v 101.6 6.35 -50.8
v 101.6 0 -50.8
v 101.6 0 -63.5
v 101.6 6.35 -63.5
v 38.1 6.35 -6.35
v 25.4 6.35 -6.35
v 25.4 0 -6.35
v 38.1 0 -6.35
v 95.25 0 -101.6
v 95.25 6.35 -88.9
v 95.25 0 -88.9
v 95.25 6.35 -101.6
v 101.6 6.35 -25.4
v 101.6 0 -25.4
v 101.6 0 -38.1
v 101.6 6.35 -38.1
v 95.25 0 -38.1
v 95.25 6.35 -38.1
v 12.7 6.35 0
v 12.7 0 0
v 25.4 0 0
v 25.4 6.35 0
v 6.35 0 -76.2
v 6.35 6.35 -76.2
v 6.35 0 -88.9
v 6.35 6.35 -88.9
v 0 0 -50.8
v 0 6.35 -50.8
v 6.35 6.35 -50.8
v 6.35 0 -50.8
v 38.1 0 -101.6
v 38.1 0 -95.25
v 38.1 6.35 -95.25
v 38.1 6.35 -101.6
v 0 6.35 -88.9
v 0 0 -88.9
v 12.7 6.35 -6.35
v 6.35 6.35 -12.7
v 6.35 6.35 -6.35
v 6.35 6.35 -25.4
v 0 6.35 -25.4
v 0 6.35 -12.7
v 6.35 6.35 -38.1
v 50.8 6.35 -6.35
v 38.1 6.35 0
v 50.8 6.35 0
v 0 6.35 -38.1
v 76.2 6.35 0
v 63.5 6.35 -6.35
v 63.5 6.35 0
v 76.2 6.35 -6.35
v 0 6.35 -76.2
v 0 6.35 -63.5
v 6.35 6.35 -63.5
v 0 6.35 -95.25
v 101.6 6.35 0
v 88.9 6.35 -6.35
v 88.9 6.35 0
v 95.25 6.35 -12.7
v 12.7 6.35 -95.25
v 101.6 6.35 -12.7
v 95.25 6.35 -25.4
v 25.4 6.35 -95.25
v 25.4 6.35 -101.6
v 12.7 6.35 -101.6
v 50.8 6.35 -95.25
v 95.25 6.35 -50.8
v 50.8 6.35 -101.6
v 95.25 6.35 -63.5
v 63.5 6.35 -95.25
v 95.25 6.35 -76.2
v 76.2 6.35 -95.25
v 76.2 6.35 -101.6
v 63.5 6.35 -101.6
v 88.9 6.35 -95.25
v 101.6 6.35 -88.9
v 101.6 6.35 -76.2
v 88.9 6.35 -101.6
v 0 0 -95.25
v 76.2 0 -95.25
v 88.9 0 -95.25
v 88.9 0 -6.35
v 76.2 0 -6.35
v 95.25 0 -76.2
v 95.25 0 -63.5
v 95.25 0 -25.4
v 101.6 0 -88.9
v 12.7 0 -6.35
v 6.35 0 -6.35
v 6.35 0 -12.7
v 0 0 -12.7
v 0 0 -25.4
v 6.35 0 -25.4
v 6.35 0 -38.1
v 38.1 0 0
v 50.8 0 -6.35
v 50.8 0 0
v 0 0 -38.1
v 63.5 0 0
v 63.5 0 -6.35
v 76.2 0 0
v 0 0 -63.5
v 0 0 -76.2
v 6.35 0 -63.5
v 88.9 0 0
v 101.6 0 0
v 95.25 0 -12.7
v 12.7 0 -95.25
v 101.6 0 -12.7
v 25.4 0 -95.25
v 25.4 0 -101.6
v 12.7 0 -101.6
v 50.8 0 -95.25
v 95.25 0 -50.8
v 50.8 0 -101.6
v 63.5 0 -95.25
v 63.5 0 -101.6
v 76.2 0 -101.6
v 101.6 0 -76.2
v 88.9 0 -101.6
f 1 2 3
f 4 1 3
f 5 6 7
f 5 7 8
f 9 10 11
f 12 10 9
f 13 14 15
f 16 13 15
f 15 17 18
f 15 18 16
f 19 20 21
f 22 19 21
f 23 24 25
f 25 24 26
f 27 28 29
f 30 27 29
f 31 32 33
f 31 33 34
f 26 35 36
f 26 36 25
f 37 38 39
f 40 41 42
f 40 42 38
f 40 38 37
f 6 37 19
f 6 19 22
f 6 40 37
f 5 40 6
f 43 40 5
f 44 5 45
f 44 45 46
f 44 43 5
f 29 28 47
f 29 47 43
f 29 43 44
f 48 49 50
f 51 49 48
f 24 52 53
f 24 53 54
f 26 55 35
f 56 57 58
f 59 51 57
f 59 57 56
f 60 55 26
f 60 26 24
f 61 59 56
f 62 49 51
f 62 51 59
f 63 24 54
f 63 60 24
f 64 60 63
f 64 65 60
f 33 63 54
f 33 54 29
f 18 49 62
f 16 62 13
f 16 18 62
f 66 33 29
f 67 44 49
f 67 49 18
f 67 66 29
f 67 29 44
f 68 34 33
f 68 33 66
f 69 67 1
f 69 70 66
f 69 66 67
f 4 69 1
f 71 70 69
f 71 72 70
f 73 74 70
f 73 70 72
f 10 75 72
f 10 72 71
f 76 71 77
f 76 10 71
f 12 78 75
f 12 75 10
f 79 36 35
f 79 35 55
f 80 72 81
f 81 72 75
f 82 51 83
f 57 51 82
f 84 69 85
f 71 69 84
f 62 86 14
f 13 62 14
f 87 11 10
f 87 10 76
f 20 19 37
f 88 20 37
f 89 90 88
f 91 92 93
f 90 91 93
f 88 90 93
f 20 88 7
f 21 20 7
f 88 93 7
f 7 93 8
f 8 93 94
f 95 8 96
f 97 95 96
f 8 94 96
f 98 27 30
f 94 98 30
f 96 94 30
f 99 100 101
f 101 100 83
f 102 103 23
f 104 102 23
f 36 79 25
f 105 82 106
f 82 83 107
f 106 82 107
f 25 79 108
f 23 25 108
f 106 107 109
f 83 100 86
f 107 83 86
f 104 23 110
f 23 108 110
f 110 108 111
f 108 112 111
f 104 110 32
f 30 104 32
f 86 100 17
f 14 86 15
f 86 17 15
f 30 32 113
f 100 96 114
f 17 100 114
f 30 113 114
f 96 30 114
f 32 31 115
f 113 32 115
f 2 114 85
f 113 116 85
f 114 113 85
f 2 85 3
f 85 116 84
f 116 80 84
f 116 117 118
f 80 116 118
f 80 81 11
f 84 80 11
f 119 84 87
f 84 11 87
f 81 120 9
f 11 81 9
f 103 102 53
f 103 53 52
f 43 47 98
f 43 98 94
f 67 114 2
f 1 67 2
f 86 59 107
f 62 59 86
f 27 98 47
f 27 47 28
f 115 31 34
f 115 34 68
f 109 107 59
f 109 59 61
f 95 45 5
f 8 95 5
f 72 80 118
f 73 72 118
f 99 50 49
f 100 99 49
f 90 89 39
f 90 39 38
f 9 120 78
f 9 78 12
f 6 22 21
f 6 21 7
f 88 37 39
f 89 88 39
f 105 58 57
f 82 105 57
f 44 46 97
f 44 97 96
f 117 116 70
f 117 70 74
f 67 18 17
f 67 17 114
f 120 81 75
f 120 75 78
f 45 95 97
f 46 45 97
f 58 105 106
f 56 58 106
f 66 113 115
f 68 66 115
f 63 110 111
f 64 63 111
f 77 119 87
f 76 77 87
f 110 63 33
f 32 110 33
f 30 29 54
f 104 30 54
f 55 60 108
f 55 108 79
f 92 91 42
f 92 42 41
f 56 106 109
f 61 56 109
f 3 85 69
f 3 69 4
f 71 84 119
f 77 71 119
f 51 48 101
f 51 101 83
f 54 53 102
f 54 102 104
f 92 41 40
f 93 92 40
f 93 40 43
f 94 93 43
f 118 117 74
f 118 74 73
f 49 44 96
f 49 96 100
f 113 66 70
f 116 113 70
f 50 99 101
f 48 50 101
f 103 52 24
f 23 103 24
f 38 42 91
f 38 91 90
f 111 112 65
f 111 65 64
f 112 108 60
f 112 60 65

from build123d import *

# Parameters (mm, degrees)
SKETCH1_W           = 101.6
SKETCH1_H           = 101.6
BOSS_EXTRUDE1_DEPTH = 6.35
SKETCH2_W           = 6.35
SKETCH2_H           = 12.7
SKETCH2_H_2         = 6.35
CUT_EXTRUDE1_DEPTH  = 6.35
SKETCH2_3_W         = 6.35
SKETCH2_3_H         = 6.35
SKETCH2_3_W_2       = 12.7
CUT_EXTRUDE2_DEPTH  = 6.35


with BuildPart() as part:
    # Sketch1 → Boss-Extrude1 (new body)
    with BuildSketch(Plane(origin=(0, 0, 0), x_dir=(1, 0, 0), z_dir=(0, 1, 0))):
        with Locations((50.8, 50.8)):
            Rectangle(SKETCH1_W, SKETCH1_H)
    extrude(amount=BOSS_EXTRUDE1_DEPTH)

    # Sketch2 → Cut-Extrude1 (cut)
    with BuildSketch(Plane(origin=(0, 6.35, 0), x_dir=(1, 0, 0), z_dir=(0, 1, 0))):
        with Locations((3.175, 82.55)):
            Rectangle(SKETCH2_W, SKETCH2_H)
        with Locations((3.175, 57.15)):
            Rectangle(SKETCH2_W, SKETCH2_H)
        with Locations((3.175, 31.75)):
            Rectangle(SKETCH2_W, SKETCH2_H)
        with Locations((3.175, 9.525)):
            Rectangle(SKETCH2_W, SKETCH2_H_2)
        with Locations((98.425, 95.25)):
            Rectangle(SKETCH2_W, SKETCH2_H)
        with Locations((98.425, 69.85)):
            Rectangle(SKETCH2_W, SKETCH2_H)
        with Locations((98.425, 44.45)):
            Rectangle(SKETCH2_W, SKETCH2_H)
        with Locations((98.425, 19.05)):
            Rectangle(SKETCH2_W, SKETCH2_H)
    extrude(amount=-CUT_EXTRUDE1_DEPTH, mode=Mode.SUBTRACT)

    # Sketch2<3> → Cut-Extrude2 (cut)
    with BuildSketch(Plane(origin=(0, 6.35, 0), x_dir=(1, 0, 0), z_dir=(0, 1, 0))):
        with Locations((9.525, 98.425)):
            Rectangle(SKETCH2_3_W, SKETCH2_3_H)
        with Locations((31.75, 98.425)):
            Rectangle(SKETCH2_3_W_2, SKETCH2_3_H)
        with Locations((57.15, 98.425)):
            Rectangle(SKETCH2_3_W_2, SKETCH2_3_H)
        with Locations((6.35, 3.175)):
            Rectangle(SKETCH2_3_W_2, SKETCH2_3_H)
        with Locations((82.55, 98.425)):
            Rectangle(SKETCH2_3_W_2, SKETCH2_3_H)
        with Locations((31.75, 3.175)):
            Rectangle(SKETCH2_3_W_2, SKETCH2_3_H)
        with Locations((57.15, 3.175)):
            Rectangle(SKETCH2_3_W_2, SKETCH2_3_H)
        with Locations((82.55, 3.175)):
            Rectangle(SKETCH2_3_W_2, SKETCH2_3_H)
    cut_extrude2 = extrude(amount=-CUT_EXTRUDE2_DEPTH, mode=Mode.SUBTRACT)

    # Mirror2: Cut-Extrude2 across plane
    add(cut_extrude2.mirror(Plane(origin=(0, 0, -50.8), x_dir=(1, 0, 0), z_dir=(0, 0, -1))), mode=Mode.SUBTRACT)


solid = part.part
